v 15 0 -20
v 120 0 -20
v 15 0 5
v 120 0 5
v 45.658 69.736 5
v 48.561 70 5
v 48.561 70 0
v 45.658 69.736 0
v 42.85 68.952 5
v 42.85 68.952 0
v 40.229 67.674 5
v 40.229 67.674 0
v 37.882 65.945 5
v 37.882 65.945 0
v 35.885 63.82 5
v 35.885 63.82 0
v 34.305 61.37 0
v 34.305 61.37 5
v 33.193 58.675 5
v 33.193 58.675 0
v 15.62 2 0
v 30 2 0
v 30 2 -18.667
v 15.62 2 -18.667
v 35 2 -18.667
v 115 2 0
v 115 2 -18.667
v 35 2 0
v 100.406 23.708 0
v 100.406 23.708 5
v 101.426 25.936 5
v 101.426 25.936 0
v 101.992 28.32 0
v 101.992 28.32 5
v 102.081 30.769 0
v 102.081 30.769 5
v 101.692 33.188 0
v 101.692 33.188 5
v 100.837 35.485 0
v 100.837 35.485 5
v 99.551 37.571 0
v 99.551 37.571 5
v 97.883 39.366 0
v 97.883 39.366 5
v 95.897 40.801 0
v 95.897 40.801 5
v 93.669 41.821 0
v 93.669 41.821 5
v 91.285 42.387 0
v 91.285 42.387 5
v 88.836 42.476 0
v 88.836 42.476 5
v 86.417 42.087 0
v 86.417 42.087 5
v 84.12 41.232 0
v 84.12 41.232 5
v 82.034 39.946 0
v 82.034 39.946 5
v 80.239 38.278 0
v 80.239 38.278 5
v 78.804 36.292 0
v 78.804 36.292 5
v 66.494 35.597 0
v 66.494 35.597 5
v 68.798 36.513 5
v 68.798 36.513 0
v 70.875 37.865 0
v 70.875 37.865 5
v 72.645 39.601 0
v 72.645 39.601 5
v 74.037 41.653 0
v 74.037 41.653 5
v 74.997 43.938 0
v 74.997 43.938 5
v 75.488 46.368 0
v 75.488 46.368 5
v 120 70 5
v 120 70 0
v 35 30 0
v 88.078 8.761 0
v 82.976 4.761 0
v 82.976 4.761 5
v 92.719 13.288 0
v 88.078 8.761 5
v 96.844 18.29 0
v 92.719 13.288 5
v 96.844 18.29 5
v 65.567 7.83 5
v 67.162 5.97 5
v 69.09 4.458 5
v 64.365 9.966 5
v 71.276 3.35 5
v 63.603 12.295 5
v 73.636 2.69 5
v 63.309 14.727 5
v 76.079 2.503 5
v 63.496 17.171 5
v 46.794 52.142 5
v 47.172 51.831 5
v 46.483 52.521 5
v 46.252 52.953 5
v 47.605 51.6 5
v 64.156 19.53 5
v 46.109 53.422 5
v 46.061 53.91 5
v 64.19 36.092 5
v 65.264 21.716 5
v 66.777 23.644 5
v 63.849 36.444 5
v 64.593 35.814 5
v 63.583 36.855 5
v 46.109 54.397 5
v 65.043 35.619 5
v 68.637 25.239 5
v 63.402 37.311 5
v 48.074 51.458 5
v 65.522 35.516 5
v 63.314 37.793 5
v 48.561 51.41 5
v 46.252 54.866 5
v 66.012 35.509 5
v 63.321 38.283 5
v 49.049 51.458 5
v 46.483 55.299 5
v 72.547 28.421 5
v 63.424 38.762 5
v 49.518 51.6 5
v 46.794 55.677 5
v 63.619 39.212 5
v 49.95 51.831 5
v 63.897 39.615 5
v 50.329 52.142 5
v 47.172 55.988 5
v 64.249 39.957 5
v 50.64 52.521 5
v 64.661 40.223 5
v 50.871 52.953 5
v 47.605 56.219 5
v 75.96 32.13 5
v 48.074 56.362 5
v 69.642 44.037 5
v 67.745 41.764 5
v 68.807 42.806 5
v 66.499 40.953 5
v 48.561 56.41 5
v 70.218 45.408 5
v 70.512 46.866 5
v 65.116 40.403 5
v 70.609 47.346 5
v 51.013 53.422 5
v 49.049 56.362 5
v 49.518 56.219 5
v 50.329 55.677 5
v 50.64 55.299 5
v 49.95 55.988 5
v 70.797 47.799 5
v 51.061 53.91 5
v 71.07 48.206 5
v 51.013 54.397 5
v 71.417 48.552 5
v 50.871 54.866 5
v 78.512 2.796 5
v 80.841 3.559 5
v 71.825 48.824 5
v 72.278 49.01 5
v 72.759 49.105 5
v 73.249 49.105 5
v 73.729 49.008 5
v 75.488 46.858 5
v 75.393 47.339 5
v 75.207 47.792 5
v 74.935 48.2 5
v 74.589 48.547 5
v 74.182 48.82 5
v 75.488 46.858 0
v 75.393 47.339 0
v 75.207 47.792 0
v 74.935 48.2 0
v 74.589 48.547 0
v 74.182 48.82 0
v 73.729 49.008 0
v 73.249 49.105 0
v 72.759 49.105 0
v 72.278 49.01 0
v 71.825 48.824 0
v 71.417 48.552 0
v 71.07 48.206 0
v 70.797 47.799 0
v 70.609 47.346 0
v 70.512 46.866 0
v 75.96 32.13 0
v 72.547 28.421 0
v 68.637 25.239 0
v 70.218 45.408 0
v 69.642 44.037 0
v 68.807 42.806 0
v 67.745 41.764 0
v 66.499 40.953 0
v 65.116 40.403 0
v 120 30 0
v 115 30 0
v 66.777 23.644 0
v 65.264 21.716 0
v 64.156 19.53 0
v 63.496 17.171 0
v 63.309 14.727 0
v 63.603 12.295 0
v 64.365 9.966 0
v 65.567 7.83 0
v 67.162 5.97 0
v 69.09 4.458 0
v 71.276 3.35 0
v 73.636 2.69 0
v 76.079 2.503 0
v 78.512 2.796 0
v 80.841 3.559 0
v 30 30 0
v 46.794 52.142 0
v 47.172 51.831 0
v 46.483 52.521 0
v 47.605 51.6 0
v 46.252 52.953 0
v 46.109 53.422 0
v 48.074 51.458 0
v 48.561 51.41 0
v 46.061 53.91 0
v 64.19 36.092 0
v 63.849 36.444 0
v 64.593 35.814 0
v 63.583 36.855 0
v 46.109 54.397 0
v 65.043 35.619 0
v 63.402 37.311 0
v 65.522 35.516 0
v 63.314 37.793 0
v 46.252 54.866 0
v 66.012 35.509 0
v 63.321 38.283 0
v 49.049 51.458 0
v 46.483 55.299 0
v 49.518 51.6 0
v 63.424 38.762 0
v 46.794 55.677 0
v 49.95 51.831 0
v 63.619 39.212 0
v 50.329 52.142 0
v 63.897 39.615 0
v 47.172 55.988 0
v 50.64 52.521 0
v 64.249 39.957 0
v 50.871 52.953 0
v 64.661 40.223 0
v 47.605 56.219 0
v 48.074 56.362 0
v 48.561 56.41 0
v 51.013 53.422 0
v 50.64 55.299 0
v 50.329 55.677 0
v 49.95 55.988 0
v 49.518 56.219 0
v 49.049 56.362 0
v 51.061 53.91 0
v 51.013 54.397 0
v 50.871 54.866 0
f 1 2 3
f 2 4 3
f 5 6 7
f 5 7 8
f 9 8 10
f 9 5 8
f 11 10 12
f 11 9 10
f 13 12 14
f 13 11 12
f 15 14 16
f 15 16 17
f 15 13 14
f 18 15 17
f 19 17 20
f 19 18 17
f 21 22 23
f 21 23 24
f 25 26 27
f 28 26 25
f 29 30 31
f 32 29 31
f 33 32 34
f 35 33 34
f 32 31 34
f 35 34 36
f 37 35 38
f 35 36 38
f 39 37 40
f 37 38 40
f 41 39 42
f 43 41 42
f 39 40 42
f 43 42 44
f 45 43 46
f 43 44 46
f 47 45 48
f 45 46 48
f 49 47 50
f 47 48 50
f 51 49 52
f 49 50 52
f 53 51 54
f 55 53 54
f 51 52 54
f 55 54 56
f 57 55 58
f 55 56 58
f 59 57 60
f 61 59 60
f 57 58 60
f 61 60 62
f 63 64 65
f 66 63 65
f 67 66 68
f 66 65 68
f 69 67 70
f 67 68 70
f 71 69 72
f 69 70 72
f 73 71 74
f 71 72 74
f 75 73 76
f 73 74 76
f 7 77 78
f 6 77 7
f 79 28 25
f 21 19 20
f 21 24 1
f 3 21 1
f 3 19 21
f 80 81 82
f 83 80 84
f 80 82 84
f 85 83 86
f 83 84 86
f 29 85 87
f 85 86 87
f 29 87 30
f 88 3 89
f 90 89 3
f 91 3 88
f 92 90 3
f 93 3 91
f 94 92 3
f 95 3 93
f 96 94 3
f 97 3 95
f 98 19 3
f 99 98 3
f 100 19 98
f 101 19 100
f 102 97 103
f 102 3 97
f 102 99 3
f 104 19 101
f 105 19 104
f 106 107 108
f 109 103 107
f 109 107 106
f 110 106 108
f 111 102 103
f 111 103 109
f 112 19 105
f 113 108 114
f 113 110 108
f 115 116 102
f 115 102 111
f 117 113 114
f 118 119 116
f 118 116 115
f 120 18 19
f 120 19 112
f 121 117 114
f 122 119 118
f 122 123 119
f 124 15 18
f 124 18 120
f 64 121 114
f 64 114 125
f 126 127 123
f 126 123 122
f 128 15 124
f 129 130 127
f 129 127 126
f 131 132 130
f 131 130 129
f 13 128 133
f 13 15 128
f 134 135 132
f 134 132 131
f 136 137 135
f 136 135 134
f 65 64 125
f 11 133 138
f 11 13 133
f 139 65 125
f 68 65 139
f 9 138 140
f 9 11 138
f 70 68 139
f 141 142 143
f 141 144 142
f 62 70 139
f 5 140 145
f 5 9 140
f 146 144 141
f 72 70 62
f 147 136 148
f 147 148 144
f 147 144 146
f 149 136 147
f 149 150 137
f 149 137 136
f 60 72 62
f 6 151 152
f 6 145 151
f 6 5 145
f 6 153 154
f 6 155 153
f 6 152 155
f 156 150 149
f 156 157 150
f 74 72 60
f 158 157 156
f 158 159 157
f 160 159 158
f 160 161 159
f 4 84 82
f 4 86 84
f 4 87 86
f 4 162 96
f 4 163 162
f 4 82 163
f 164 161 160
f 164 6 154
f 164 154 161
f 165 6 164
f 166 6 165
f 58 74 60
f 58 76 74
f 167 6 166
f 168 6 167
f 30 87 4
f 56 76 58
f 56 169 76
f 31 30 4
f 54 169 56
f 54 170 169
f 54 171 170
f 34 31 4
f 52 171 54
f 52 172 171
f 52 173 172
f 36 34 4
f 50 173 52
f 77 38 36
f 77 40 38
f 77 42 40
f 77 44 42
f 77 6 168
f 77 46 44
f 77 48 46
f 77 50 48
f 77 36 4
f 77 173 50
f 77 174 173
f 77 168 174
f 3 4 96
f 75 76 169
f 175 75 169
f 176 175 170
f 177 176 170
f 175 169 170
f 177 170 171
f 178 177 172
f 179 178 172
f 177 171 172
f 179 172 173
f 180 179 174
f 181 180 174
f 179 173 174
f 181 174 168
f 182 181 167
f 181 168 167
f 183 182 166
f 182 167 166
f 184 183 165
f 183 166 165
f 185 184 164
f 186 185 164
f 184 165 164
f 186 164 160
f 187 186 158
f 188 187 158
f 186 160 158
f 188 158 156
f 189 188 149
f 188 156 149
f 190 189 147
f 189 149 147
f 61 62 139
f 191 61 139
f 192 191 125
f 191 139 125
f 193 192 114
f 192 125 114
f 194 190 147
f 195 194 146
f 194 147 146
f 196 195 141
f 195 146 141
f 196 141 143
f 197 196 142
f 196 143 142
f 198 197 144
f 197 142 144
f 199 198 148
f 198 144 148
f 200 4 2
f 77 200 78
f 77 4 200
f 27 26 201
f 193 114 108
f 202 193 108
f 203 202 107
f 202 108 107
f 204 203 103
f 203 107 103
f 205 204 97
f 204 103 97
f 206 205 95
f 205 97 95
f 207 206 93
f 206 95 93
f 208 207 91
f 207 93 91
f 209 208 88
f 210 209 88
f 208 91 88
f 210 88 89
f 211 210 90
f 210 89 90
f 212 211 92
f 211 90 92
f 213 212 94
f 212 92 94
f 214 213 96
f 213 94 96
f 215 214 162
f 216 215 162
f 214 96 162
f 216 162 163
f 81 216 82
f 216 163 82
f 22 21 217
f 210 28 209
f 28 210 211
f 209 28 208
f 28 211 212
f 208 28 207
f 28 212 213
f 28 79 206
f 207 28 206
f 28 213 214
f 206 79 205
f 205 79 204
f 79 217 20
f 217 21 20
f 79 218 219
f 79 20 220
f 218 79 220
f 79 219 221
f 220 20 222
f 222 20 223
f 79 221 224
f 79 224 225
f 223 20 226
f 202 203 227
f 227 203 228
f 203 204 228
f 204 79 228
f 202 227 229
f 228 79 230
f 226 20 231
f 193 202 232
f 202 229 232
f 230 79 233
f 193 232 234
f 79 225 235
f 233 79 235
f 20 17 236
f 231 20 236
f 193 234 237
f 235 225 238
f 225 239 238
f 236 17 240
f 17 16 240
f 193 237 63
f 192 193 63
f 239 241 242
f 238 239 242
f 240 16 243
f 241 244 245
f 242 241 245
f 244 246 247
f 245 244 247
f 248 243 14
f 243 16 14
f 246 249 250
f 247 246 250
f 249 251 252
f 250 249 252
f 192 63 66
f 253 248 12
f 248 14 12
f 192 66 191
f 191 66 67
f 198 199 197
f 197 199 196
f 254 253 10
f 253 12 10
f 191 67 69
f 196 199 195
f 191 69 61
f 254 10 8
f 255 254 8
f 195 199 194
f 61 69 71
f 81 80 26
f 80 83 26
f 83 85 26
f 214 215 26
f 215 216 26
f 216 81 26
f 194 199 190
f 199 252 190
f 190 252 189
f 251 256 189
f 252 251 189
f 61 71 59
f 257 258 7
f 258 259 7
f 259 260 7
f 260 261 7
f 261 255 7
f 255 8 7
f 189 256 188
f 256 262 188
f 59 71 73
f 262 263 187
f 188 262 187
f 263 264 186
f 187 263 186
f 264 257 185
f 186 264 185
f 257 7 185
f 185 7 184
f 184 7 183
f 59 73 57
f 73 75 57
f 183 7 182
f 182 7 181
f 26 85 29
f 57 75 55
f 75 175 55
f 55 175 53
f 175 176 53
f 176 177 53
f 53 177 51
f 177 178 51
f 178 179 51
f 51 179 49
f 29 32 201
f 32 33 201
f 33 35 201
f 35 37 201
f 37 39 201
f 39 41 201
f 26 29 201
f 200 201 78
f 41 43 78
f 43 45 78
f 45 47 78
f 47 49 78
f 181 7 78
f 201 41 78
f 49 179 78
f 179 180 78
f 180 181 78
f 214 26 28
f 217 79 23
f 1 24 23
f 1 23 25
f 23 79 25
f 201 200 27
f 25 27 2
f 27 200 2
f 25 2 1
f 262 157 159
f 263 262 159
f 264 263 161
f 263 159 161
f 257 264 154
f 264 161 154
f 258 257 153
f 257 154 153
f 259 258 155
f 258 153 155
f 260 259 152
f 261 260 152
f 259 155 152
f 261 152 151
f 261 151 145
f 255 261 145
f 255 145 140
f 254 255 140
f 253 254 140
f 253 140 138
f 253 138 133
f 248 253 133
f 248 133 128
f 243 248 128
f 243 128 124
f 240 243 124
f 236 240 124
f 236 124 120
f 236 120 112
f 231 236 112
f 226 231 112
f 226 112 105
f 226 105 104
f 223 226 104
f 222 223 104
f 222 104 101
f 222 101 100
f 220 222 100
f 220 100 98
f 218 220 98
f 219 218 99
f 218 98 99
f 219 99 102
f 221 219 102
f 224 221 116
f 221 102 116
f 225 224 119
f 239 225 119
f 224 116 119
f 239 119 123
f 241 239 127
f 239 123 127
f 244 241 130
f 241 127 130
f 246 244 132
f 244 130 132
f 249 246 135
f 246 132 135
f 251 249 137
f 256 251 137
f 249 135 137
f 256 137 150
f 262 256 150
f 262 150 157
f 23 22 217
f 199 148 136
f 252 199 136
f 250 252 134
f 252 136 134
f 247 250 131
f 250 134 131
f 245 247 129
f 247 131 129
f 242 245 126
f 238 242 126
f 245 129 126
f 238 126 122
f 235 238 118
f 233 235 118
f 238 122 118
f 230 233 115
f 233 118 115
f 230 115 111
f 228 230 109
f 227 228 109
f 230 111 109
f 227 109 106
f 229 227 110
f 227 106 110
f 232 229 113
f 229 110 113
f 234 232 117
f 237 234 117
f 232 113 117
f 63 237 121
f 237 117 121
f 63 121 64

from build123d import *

# Parameters (mm, degrees)
SKETCH1_W           = 120
SKETCH1_H           = 100
BOSS_EXTRUDE1_DEPTH = 5
SKETCH2_R           = 2.5
CUT_EXTRUDE1_DEPTH  = 6
SKETCH3_W           = 120
SKETCH3_H           = 2
BOSS_EXTRUDE2_DEPTH = 20
CUT_EXTRUDE2_DEPTH  = 26
CUT_EXTRUDE3_DEPTH  = 26
SKETCH6_W           = 5
SKETCH6_H           = 30
BOSS_EXTRUDE3_DEPTH = 20
CUT_EXTRUDE4_DEPTH  = 106


with BuildPart() as part:
    # Sketch1 → Boss-Extrude1 (new body)
    with BuildSketch(Plane.XY):
        with Locations((60, 50)):
            Rectangle(SKETCH1_W, SKETCH1_H)
    extrude(amount=BOSS_EXTRUDE1_DEPTH)

    # Sketch2 → Cut-Extrude1 (cut, through all)
    with BuildSketch(Plane.XY.offset(5)):
        with Locations((48.561388608, 53.909722104)):
            Circle(SKETCH2_R)
        with BuildLine():
            ThreePointArc((82.975974789, 4.760599446), (92.719162031, 13.288409394), (100.405906554, 23.707967867))
            ThreePointArc((100.405906554, 23.707967867), (95.896997447, 40.800941239), (78.804024076, 36.292032133))
            ThreePointArc((78.804024076, 36.292032133), (74.320089771, 30.213956356), (68.63656388, 25.239400554))
            ThreePointArc((68.63656388, 25.239400554), (65.566868781, 7.830294546), (82.975974789, 4.760599446))
        make_face()
    extrude(amount=-CUT_EXTRUDE1_DEPTH, mode=Mode.SUBTRACT)

    # Sketch3 → Boss-Extrude2 (add)
    with BuildSketch(Plane(origin=(0, 0, 0), x_dir=(-1, 0, 0), z_dir=(0, 0, -1))):
        with Locations((-60, 1)):
            Rectangle(SKETCH3_W, SKETCH3_H)
    extrude(amount=BOSS_EXTRUDE2_DEPTH)

    # Sketch4 → Cut-Extrude2 (cut, through all)
    with BuildSketch(Plane.XY.offset(5)):
        with BuildLine():
            ThreePointArc((66.494283868, 35.596794606), (72.644903394, 39.60143936), (75.487572744, 46.368013909))
            ThreePointArc((75.487572744, 46.368013909), (73.248961533, 49.104548186), (70.512427256, 46.865936976))
            ThreePointArc((70.512427256, 46.865936976), (68.806825647, 42.805992246), (65.116453931, 40.403205394))
            ThreePointArc((65.116453931, 40.403205394), (63.402163505, 37.311085032), (66.494283868, 35.596794606))
        make_face()
    extrude(amount=-CUT_EXTRUDE2_DEPTH, mode=Mode.SUBTRACT)

    # Sketch5 → Cut-Extrude3 (cut, through all)
    with BuildSketch(Plane.XY.offset(5)):
        with BuildLine():
            Line((120, 70), (48.561388608, 70))
            ThreePointArc((48.561388608, 70), (39.016134462, 66.862913451), (33.192915272, 58.674915711))
            Line((33.192915272, 58.674915711), (15, 0))
            Line((15, 0), (0, 0))
            Line((0, 0), (0, 100))
            Line((0, 100), (120, 100))
            Line((120, 100), (120, 70))
        make_face()
    extrude(amount=-CUT_EXTRUDE3_DEPTH, mode=Mode.SUBTRACT)

    # Sketch6 → Boss-Extrude3 (add, through all)
    with BuildSketch(Plane(origin=(0, 0, 0), x_dir=(-1, 0, 0), z_dir=(0, 0, -1))):
        with Locations((-117.5, 15)):
            Rectangle(SKETCH6_W, SKETCH6_H)
        with Locations((-32.5, 15)):
            Rectangle(SKETCH6_W, SKETCH6_H)
    extrude(amount=BOSS_EXTRUDE3_DEPTH)

    # Sketch9 → Cut-Extrude4 (cut, through all)
    with BuildSketch(Plane(origin=(120, 0, 0), x_dir=(0, 0, -1), z_dir=(1, 0, 0))):
        Polygon((0, 30), (20, 0), (20, 30), align=None)
    extrude(amount=-CUT_EXTRUDE4_DEPTH, mode=Mode.SUBTRACT)


solid = part.part
